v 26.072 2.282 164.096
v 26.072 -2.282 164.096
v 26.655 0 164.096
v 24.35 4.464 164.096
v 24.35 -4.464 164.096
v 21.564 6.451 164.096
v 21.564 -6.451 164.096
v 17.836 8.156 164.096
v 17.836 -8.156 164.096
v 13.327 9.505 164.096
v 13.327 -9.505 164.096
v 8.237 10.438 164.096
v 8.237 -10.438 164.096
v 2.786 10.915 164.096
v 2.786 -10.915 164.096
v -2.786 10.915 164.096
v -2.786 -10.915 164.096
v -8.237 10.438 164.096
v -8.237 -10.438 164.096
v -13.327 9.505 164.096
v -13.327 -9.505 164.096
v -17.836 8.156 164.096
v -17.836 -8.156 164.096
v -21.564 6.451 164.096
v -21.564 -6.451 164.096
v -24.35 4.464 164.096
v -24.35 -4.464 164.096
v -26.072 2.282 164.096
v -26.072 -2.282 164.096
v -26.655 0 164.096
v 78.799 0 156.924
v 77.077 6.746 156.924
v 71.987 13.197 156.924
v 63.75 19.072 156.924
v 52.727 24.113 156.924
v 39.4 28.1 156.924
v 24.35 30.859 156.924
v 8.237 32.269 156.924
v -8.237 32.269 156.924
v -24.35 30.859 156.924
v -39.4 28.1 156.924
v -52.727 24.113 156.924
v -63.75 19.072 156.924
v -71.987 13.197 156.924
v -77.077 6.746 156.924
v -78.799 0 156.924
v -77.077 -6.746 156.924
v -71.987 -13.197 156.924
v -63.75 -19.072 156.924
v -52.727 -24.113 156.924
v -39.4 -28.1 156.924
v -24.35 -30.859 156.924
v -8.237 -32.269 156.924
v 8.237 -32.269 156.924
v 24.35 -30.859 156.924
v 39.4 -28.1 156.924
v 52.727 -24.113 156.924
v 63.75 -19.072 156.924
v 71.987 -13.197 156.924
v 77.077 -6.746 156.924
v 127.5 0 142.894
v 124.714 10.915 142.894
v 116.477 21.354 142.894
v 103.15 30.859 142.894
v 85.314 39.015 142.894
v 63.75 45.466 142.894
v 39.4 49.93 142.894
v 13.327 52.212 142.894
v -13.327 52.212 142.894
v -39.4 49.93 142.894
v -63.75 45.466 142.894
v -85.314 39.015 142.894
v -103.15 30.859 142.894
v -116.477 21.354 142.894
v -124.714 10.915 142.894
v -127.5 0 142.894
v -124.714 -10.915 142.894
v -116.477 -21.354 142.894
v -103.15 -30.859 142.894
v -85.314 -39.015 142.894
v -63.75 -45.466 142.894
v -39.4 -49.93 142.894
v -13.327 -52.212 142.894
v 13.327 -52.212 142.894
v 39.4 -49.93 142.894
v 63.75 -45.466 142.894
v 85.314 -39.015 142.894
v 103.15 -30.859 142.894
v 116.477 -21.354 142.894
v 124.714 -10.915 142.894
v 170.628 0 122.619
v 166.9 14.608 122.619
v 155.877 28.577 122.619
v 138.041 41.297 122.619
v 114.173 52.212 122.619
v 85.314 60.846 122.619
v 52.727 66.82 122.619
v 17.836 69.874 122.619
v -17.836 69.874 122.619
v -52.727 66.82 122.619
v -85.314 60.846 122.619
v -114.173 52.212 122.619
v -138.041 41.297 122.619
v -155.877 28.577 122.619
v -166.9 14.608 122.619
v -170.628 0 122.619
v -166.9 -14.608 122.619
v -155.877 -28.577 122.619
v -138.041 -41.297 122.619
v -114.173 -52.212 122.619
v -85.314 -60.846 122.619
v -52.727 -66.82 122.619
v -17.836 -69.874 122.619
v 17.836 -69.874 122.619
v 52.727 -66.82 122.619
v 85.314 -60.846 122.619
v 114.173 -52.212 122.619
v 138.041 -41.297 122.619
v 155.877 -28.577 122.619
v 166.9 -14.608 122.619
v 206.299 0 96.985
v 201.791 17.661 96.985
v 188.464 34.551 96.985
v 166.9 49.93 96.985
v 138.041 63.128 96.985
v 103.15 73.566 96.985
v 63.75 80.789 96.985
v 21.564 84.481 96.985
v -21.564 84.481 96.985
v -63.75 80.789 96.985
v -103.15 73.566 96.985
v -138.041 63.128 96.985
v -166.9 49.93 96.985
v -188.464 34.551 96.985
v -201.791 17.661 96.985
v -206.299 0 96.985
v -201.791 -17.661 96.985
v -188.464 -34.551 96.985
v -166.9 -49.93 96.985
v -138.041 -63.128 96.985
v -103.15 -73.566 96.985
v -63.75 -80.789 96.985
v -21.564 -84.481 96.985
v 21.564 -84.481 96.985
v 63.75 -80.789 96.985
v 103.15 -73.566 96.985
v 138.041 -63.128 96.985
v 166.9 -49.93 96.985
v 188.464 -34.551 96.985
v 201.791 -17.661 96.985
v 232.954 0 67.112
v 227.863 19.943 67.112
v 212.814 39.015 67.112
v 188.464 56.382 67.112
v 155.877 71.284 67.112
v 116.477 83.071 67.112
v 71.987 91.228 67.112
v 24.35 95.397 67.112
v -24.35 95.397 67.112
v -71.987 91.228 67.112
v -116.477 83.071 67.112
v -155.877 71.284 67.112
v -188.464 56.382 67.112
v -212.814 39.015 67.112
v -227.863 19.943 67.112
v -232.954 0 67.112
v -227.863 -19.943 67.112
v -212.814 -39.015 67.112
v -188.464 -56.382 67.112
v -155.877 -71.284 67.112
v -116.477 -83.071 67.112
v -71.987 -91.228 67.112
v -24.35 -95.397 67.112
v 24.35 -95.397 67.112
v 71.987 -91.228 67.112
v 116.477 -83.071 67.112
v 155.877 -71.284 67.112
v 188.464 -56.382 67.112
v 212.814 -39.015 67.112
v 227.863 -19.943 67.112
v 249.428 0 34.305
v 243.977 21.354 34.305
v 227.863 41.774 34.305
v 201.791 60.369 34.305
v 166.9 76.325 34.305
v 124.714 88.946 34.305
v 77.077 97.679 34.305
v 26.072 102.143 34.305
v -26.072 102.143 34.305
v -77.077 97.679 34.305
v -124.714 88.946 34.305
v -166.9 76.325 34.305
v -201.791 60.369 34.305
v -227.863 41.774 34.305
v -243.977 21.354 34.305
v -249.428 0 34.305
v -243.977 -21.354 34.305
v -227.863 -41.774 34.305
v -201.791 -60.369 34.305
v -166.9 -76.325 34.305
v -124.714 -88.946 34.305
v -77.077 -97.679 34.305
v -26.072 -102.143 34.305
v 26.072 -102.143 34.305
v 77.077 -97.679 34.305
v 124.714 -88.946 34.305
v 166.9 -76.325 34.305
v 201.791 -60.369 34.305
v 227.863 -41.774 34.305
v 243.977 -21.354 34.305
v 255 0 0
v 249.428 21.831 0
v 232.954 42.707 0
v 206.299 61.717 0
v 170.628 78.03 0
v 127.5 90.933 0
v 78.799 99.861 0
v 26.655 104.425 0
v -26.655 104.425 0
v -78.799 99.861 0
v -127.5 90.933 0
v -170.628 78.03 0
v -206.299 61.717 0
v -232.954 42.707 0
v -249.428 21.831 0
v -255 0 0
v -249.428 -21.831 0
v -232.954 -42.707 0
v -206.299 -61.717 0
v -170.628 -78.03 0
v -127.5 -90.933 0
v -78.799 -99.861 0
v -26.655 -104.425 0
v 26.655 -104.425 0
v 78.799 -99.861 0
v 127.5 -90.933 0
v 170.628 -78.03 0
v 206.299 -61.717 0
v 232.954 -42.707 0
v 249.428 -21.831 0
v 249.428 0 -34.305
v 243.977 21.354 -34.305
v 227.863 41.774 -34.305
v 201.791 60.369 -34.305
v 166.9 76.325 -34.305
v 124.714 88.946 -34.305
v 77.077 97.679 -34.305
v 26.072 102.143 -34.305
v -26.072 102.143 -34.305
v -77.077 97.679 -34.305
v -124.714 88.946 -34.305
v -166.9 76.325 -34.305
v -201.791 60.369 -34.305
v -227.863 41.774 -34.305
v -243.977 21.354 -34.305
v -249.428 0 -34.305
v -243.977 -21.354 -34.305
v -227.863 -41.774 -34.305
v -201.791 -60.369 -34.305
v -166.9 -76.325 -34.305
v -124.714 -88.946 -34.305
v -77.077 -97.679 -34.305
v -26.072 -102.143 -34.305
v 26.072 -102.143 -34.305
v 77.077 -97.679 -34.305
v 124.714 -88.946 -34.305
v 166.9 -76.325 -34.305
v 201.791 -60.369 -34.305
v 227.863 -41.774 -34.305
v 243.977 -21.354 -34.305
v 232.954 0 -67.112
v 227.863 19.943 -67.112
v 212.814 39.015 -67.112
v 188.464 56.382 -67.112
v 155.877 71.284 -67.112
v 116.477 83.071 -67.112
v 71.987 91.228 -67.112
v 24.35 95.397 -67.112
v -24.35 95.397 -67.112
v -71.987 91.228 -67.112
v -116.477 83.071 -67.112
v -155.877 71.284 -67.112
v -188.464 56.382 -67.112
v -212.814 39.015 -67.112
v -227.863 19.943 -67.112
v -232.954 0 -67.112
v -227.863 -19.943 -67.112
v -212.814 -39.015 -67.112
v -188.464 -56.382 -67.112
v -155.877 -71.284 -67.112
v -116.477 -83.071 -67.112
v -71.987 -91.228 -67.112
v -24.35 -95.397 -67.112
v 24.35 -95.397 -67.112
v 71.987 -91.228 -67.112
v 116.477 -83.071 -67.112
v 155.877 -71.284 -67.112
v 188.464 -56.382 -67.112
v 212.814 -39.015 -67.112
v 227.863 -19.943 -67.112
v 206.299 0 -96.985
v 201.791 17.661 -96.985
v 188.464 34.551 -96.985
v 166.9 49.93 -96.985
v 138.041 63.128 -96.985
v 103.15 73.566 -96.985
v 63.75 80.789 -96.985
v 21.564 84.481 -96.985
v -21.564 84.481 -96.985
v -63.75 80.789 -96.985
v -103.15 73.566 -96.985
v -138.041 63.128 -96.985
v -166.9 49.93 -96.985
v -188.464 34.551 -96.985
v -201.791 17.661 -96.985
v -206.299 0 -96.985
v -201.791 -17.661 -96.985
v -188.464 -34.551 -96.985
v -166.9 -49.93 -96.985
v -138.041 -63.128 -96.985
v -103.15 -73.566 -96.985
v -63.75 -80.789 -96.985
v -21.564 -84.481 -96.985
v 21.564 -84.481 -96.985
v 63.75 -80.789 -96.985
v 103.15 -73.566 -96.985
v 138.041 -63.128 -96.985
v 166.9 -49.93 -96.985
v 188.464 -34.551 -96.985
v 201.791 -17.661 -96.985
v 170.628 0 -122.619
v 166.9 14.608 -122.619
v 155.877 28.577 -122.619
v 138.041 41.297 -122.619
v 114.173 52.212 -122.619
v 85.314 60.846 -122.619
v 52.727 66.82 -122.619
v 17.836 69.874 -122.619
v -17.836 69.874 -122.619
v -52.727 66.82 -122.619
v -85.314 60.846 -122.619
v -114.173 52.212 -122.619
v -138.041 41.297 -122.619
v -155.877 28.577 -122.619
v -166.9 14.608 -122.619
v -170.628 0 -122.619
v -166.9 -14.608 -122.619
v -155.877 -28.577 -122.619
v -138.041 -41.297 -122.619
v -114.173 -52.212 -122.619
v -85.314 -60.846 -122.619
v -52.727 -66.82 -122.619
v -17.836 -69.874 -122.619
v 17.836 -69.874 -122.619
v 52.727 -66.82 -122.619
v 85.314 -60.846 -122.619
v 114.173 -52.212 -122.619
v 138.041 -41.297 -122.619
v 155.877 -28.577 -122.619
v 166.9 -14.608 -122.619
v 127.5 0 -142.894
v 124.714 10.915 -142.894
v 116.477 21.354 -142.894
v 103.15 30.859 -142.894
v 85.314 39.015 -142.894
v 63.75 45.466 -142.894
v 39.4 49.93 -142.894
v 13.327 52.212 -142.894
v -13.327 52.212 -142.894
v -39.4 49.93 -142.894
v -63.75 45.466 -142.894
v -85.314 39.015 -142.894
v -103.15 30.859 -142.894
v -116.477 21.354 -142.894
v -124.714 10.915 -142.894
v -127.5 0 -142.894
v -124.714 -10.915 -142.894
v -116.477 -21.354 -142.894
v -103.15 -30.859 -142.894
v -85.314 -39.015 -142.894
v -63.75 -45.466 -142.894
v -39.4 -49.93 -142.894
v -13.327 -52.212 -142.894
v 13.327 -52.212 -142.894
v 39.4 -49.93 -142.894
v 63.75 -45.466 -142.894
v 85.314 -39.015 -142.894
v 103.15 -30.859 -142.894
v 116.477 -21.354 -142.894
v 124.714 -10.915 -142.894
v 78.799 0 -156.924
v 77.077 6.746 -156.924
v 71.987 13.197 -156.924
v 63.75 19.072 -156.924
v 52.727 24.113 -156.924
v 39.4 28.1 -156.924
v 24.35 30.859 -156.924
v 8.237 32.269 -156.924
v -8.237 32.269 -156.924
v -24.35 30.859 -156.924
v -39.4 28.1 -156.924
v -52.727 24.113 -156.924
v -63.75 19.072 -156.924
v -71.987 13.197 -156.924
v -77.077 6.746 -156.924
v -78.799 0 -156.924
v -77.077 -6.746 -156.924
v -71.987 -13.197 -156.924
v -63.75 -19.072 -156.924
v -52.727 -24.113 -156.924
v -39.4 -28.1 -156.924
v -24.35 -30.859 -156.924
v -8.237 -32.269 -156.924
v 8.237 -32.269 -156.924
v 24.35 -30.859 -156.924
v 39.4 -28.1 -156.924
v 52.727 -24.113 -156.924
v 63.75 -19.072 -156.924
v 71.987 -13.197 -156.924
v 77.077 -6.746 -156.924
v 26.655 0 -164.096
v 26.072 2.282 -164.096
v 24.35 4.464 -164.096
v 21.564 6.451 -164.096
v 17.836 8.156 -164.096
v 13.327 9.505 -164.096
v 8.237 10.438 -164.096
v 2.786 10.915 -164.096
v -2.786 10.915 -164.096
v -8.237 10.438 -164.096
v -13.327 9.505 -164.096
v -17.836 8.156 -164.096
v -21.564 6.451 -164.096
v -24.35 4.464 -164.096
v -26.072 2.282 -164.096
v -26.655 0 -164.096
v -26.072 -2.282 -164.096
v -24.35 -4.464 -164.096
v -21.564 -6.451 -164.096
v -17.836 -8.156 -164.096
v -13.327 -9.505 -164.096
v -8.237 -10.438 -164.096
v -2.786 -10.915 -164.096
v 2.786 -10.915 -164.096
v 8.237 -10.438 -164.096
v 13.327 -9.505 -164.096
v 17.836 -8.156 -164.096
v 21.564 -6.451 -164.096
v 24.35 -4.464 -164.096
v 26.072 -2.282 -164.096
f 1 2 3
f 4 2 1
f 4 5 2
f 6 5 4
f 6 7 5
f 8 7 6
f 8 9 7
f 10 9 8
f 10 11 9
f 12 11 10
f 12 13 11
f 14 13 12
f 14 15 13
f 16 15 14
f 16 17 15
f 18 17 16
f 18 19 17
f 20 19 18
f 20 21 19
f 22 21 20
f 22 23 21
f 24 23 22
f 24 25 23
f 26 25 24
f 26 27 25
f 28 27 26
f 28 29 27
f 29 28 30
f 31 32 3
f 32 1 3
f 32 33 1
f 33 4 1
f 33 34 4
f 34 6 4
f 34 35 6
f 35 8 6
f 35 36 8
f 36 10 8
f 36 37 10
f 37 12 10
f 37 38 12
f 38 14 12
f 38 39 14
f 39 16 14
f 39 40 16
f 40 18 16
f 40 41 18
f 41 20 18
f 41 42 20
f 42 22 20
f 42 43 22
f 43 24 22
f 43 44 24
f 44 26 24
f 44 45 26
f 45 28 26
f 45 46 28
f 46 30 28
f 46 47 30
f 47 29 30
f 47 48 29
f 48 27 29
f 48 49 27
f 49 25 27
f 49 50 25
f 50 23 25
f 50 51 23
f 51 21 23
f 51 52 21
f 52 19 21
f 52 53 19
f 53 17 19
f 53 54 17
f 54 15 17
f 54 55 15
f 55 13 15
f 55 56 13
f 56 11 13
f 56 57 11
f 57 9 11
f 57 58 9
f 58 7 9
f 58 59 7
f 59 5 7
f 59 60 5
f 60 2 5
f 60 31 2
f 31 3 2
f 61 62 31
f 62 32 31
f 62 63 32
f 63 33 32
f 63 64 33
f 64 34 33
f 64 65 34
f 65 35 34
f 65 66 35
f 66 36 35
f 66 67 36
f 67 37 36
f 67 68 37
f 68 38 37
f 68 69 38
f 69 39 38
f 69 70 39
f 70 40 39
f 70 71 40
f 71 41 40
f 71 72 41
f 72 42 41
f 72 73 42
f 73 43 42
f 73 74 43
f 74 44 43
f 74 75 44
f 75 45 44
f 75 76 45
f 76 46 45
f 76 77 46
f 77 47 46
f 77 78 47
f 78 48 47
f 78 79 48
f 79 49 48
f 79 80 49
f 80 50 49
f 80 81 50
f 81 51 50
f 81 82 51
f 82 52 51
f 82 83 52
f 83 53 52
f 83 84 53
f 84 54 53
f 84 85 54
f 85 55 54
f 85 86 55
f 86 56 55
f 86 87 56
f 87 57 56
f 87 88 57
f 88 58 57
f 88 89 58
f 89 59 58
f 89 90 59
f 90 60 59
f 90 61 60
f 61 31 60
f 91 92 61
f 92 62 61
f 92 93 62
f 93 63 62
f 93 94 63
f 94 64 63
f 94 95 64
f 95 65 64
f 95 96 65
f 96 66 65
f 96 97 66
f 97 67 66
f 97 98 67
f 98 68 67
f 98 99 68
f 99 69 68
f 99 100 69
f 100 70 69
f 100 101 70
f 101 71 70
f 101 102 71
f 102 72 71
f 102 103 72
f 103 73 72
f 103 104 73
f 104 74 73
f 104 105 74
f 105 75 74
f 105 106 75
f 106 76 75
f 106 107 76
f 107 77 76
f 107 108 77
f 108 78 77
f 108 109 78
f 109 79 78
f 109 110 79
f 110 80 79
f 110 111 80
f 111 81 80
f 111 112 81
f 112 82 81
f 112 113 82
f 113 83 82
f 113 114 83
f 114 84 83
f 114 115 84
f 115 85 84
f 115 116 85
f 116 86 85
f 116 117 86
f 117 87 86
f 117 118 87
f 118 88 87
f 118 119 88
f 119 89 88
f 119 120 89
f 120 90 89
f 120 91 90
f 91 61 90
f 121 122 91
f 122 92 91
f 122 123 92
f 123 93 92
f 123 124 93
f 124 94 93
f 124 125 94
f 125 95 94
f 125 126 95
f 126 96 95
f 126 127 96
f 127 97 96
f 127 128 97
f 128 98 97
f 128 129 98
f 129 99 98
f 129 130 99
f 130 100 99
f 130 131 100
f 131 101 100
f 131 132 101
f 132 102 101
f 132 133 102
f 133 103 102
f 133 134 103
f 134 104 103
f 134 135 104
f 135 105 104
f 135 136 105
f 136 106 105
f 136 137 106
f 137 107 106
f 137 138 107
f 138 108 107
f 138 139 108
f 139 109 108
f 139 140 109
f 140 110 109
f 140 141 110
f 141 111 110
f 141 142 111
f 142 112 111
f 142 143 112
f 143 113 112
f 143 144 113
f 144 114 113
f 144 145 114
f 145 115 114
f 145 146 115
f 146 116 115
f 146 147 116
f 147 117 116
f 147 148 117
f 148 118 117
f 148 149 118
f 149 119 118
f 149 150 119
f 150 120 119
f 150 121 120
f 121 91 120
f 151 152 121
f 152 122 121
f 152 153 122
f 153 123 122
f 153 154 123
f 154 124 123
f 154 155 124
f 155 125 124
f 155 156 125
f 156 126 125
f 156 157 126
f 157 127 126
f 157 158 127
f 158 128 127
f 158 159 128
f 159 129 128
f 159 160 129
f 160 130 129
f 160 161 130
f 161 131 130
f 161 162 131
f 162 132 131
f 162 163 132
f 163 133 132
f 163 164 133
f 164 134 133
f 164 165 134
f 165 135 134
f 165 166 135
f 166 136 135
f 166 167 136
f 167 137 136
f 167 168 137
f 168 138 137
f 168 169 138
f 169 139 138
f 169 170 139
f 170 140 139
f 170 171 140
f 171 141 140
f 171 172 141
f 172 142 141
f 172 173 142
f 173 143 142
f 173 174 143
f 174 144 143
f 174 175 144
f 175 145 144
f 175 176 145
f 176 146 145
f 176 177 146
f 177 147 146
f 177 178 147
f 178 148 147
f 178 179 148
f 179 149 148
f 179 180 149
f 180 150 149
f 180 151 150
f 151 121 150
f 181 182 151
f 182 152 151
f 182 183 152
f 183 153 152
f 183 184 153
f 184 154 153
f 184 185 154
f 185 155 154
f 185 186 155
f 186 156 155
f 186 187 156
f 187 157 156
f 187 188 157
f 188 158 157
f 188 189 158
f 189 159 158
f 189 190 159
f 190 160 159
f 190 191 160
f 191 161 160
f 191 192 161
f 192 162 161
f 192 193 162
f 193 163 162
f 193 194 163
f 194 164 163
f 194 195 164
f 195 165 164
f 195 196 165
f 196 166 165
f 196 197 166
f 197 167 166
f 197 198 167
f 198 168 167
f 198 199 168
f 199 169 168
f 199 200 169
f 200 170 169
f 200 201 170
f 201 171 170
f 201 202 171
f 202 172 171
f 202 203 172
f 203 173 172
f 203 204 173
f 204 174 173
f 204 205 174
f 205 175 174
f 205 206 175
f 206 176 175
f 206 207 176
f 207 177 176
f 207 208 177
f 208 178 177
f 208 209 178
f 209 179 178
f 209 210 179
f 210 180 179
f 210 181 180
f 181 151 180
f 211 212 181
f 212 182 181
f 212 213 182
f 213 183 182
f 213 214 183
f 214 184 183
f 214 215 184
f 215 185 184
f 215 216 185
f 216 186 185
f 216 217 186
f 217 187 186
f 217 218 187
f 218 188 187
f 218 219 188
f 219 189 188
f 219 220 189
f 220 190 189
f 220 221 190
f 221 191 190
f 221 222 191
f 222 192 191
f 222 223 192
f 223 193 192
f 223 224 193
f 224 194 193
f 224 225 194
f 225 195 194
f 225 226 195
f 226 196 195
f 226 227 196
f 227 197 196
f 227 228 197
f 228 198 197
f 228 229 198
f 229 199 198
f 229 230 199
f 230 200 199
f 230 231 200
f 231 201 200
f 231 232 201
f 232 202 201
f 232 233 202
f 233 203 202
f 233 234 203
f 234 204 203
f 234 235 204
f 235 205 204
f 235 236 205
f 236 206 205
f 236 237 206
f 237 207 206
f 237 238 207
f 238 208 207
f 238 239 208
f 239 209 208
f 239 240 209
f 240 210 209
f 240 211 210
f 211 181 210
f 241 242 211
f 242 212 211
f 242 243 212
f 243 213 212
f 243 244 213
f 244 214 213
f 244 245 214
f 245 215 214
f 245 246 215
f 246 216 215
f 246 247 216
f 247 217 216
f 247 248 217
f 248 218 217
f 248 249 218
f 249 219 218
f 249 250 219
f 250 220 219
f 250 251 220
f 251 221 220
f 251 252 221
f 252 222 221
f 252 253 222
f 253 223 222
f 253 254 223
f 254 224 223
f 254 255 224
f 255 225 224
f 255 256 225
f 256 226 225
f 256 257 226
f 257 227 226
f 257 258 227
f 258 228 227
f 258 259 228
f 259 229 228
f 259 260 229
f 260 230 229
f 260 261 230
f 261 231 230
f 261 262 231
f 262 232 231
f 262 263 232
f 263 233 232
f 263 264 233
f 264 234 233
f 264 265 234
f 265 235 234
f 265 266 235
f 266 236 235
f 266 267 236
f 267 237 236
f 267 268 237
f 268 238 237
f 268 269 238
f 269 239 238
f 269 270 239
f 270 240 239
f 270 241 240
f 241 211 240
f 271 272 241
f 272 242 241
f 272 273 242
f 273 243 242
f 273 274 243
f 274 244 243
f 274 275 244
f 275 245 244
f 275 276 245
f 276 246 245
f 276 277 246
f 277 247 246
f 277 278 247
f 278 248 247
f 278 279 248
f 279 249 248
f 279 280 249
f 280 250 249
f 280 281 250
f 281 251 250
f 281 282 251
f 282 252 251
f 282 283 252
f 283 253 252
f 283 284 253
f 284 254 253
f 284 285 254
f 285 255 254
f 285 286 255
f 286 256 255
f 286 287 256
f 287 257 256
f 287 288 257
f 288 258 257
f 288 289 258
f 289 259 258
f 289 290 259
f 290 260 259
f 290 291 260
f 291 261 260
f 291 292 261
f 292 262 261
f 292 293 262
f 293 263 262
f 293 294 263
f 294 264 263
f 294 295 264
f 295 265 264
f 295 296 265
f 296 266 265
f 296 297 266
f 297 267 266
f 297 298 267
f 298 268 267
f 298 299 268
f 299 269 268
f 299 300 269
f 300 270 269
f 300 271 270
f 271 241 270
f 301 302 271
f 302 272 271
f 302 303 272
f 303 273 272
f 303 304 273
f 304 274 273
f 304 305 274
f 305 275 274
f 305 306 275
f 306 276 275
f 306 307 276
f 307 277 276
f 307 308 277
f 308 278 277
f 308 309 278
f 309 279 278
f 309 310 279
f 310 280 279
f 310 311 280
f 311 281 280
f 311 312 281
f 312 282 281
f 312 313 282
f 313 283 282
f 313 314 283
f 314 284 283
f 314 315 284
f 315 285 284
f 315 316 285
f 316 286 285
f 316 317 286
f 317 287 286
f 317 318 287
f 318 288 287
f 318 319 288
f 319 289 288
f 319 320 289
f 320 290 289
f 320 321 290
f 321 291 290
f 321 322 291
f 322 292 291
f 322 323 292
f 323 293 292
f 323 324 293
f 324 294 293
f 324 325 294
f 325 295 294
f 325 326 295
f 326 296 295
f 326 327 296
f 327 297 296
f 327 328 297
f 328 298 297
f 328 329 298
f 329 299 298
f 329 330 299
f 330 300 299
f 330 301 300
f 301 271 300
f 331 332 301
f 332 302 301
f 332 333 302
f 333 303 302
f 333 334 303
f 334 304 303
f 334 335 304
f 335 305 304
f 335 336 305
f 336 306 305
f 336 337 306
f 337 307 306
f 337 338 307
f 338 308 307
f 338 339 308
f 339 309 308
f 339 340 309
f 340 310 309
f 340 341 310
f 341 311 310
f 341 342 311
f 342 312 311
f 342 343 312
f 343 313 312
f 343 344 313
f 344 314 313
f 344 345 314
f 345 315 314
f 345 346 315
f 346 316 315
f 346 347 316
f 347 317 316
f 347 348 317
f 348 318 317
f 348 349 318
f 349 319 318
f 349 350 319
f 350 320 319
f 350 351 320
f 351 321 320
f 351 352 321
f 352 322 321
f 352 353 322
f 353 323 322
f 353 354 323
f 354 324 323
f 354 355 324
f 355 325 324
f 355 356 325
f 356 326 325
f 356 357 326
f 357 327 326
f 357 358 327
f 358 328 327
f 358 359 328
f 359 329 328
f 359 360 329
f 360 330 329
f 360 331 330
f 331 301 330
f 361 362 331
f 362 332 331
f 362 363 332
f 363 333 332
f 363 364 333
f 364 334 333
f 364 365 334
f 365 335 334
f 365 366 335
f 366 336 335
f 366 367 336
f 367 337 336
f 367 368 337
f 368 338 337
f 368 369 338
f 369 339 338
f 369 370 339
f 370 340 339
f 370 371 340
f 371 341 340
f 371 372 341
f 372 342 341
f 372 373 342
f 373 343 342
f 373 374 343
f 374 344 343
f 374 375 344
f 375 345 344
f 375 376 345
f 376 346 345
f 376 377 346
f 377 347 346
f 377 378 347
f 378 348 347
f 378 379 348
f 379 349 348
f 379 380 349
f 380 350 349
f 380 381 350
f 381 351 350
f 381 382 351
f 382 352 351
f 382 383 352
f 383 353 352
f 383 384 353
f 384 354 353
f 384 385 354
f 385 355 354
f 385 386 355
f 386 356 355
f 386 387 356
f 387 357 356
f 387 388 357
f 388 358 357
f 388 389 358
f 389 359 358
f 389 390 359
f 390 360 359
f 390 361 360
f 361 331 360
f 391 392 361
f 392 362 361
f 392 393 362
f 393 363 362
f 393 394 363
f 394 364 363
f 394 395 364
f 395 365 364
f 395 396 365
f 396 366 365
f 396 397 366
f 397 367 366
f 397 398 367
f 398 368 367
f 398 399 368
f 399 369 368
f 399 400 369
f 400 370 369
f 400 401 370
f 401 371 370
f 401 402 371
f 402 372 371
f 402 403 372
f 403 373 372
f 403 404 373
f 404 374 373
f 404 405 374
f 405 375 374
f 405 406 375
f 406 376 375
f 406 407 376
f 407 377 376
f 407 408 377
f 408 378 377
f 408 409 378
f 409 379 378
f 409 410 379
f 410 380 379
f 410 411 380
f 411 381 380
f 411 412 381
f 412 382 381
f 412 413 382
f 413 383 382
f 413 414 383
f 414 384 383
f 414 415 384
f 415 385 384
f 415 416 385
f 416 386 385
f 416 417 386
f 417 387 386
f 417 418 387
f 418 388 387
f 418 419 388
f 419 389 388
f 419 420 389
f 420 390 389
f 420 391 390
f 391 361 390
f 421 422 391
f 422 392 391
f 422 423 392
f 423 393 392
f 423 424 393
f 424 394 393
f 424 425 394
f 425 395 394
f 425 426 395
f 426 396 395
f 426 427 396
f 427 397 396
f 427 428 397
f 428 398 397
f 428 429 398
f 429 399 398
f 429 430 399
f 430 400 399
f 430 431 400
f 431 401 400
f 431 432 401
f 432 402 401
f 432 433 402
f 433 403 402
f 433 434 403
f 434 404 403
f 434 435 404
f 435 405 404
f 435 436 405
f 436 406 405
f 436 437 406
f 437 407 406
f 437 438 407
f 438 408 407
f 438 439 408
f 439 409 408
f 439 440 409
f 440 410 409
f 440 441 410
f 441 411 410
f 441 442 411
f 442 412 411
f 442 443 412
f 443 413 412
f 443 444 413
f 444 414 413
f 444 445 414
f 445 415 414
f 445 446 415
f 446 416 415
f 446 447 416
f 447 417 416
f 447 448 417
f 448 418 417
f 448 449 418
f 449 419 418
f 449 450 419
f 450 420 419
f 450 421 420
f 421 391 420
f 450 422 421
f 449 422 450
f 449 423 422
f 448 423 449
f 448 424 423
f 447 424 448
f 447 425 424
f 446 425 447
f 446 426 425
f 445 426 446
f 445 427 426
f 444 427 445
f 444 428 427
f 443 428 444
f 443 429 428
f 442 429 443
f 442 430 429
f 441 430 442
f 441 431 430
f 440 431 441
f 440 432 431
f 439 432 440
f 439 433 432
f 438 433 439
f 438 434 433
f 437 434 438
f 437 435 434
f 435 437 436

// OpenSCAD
// Generated by SolidPython 1.0.1 on 2020-07-29 00:46:52


scale(v = [17, 7, 11]) {
	sphere(r = 15);
}
/***********************************************
*********      SolidPython code:      **********
************************************************
 
# import packages: SolidPython
from solid import *
from solid.utils import *
from itertools import chain, combinations, permutations


class Resize:

    def __init__(self, scad_file):
        self.scad_file = scad_file
        #self.scad_file = import_scad(scad_file)
        # cone/cylinder param:
        self.r1 = 0
        self.r2 = 0
        self.h = 0
        # rectangular prism param:
        self.w = 0
        self.l = 0
        # ellipse param:
        self.r = 0

    # import OpenScad code (file name corresponds to shape)


    # classify shape + parameters
    def assign(self, param1, param2, param3):
        if self.scad_file == 'cone.scad':
            self.r1 = param1
            self.r2 = param2
            self.h = param3
        elif self.scad_file == 'cylinder.scad':
            self.r1 = param1
            self.r2 = param2
            self.h = param3
        elif self.scad_file == 'rectangularPrism.scad':
            self.h = param1
            self.l = param2
            self.w = param3
        else:
            self.r = param1
            self.h = param2

    # resize parameters
    def iterate(self):
        x = range(3, 20, 2)
        i = 1
        if self.scad_file == 'cone.scad':
            tempList = list(permutations(x, 2))
            for temp in tempList:
                param1 = temp[0]
                param2 = temp[1]
                filepath = 'produced_scad_files/' + 'cone' + str(param1) + '_' + str(param2) + '_' + '.scad'
                scad_render_to_file(cylinder(h=param1, r1=param2, r2=0), filepath)

        elif self.scad_file == 'cylinder.scad':
            tempList = list(permutations(x, 3))
            for temp in tempList:
                param1 = temp[0]
                param2 = temp[1]
                filepath = 'produced_scad_files/' + 'cylinder' + str(param1) + '_' + str(param2) + '_' + '.scad'
                scad_render_to_file(cylinder(h=param1, r1=param2, r2=param2), filepath)

        elif self.scad_file == 'rectangularPrism.scad':
            tempList = list(permutations(x, 3))
            for temp in tempList:
                param1 = temp[0]
                param2 = temp[1]
                param3 = temp[2]
                filepath = 'produced_scad_files/' + 'rectangularPrism' + str(param1) + '_' + str(param2) + '_' + str(
                    param3) + '.scad'
                scad_render_to_file(cube(size=(param1, param2, param3)), filepath)

        elif self.scad_file == 'ellipse.scad':
            tempList = list(permutations(x, 4))
            for temp in tempList:
                param1 = temp[0]
                param2 = temp[1]
                param3 = temp[2]
                param4 = temp[3]
                filepath = 'produced_scad_files/' + 'ellipse' + str(param1) + '_' + str(param2) + '_' + str(param3) + '_' + str(param4) + '.scad'
                scad_render_to_file(scale([param1, param2, param3])(sphere(r=param4)), filepath)

    def render_to_scadfile(self):
        scad_render_to_file(scad, 'example.scad') 
 
************************************************/
